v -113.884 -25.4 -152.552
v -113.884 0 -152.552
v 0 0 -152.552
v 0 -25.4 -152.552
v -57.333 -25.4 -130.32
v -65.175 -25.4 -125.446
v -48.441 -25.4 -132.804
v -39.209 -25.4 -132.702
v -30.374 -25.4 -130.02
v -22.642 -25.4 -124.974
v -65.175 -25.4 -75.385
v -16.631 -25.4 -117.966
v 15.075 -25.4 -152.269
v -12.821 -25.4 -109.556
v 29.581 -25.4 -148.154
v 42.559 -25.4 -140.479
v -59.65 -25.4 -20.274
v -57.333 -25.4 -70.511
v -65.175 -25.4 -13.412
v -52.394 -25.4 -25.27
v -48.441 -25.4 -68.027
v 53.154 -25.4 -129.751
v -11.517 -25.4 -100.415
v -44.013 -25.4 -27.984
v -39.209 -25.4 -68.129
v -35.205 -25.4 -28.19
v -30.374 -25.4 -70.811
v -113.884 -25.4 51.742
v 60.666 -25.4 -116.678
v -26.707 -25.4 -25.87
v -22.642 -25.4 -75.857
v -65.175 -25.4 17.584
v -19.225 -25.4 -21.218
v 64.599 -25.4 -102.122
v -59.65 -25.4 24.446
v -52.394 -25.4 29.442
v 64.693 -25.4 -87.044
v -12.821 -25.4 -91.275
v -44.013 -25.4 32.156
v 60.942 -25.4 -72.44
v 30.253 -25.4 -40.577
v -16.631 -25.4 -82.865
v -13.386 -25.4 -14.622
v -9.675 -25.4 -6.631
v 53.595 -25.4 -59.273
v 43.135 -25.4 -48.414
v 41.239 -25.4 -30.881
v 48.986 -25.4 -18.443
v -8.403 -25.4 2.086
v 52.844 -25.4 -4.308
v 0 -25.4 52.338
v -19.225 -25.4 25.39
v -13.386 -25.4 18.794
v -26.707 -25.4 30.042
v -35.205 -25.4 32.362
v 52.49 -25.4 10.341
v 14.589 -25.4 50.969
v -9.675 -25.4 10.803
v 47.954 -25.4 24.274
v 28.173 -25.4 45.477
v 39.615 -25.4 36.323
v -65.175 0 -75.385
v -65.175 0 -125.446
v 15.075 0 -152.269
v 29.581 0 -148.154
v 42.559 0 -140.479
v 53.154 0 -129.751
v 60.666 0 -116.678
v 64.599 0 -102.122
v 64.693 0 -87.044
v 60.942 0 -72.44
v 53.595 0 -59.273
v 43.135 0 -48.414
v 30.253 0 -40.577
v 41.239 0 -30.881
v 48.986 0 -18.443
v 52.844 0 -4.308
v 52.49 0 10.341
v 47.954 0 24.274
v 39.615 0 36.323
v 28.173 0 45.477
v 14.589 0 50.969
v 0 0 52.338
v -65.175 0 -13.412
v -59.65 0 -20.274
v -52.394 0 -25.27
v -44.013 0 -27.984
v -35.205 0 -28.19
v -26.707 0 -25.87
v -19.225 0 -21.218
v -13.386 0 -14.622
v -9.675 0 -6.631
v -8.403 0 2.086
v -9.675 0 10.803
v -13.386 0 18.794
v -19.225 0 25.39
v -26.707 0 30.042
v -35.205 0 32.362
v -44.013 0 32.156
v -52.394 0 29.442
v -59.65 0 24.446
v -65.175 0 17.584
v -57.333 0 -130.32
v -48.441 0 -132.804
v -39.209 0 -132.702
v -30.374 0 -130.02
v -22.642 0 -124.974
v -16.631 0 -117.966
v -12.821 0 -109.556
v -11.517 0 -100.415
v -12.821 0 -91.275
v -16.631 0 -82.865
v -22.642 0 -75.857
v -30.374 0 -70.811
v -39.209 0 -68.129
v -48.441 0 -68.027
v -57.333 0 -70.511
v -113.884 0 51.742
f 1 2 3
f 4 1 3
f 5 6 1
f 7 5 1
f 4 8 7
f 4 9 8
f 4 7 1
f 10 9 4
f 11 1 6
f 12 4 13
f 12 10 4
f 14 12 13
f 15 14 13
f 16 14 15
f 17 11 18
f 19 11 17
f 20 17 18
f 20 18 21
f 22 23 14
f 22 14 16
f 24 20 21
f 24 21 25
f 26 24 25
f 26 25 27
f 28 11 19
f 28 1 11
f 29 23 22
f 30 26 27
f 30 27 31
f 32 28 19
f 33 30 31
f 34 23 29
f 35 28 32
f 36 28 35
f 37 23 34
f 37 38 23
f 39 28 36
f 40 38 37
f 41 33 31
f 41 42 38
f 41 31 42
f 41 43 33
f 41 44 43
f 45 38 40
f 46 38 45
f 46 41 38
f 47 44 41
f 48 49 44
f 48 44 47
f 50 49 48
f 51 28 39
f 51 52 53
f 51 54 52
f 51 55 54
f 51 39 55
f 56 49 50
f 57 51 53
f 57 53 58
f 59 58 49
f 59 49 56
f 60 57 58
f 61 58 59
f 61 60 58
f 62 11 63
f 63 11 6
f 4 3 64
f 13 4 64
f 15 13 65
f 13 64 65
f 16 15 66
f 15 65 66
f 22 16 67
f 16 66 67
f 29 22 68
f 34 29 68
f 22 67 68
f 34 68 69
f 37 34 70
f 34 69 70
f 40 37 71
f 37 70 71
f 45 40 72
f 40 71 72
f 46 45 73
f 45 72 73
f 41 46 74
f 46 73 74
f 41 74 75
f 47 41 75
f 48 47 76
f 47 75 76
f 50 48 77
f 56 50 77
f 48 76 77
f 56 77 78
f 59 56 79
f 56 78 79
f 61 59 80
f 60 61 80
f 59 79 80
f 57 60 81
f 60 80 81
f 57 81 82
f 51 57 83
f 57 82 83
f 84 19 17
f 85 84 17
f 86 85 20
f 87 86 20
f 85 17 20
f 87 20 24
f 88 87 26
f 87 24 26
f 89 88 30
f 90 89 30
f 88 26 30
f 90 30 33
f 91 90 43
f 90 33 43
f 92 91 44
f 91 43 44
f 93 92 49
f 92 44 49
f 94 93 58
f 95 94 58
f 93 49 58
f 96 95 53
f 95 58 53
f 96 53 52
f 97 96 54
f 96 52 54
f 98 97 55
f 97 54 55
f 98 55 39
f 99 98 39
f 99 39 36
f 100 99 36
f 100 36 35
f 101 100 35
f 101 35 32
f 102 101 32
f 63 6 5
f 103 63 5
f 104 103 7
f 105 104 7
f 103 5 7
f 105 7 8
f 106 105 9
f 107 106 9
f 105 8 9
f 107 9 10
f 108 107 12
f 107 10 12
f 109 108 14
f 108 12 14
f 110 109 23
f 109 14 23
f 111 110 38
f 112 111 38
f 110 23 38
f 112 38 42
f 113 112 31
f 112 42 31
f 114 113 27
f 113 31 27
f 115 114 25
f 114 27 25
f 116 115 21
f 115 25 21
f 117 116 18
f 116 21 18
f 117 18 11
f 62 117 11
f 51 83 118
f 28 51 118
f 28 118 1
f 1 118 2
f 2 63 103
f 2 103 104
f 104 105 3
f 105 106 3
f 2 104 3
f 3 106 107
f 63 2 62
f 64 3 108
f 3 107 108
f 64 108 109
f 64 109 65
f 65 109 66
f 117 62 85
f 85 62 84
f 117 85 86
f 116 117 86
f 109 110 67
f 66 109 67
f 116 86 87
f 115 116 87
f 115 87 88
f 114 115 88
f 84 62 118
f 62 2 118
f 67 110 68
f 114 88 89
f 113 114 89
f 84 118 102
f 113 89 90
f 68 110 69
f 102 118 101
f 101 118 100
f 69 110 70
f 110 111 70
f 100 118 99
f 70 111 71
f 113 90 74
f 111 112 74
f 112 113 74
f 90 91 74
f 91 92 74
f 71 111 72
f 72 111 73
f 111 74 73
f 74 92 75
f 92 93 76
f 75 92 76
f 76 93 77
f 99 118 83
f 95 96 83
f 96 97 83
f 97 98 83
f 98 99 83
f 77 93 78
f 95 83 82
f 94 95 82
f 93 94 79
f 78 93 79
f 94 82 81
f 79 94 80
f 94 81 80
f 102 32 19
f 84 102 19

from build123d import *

# Parameters (mm, degrees)
F1_DEPTH = 25.4
F3_DEPTH = 25.4


with BuildPart() as f1:
    # F0 (on Front) → F1 (new body)
    with BuildSketch(Plane.XZ):
        with BuildLine():
            Line((0, 52.337721), (-113.883786, 51.742114))
            Line((-113.883786, 51.742114), (-113.883786, -152.551606))
            Line((-113.883786, -152.551606), (0, -152.551606))
            ThreePointArc((0, -152.551606), (63.101704, -109.526382), (30.253483, -40.577203))
            ThreePointArc((30.253483, -40.577203), (50.728837, 17.472448), (0, 52.337721))
        make_face()
    extrude(amount=F1_DEPTH)

    # F2 (on face) → F3 (cut)
    with BuildSketch(Plane.XZ.offset(25.4)):
        with BuildLine():
            ThreePointArc((-65.174758, -13.412004), (-8.402959, 2.085997), (-65.174758, 17.583998))
            Line((-65.174758, 17.583998), (-65.174758, -13.412004))
        make_face()
        with BuildLine():
            ThreePointArc((-65.174758, -125.446111), (-11.516542, -100.415442), (-65.174758, -75.384773))
            Line((-65.174758, -75.384773), (-65.174758, -125.446111))
        make_face()
    extrude(amount=-F3_DEPTH, mode=Mode.SUBTRACT)


solid = f1.part
